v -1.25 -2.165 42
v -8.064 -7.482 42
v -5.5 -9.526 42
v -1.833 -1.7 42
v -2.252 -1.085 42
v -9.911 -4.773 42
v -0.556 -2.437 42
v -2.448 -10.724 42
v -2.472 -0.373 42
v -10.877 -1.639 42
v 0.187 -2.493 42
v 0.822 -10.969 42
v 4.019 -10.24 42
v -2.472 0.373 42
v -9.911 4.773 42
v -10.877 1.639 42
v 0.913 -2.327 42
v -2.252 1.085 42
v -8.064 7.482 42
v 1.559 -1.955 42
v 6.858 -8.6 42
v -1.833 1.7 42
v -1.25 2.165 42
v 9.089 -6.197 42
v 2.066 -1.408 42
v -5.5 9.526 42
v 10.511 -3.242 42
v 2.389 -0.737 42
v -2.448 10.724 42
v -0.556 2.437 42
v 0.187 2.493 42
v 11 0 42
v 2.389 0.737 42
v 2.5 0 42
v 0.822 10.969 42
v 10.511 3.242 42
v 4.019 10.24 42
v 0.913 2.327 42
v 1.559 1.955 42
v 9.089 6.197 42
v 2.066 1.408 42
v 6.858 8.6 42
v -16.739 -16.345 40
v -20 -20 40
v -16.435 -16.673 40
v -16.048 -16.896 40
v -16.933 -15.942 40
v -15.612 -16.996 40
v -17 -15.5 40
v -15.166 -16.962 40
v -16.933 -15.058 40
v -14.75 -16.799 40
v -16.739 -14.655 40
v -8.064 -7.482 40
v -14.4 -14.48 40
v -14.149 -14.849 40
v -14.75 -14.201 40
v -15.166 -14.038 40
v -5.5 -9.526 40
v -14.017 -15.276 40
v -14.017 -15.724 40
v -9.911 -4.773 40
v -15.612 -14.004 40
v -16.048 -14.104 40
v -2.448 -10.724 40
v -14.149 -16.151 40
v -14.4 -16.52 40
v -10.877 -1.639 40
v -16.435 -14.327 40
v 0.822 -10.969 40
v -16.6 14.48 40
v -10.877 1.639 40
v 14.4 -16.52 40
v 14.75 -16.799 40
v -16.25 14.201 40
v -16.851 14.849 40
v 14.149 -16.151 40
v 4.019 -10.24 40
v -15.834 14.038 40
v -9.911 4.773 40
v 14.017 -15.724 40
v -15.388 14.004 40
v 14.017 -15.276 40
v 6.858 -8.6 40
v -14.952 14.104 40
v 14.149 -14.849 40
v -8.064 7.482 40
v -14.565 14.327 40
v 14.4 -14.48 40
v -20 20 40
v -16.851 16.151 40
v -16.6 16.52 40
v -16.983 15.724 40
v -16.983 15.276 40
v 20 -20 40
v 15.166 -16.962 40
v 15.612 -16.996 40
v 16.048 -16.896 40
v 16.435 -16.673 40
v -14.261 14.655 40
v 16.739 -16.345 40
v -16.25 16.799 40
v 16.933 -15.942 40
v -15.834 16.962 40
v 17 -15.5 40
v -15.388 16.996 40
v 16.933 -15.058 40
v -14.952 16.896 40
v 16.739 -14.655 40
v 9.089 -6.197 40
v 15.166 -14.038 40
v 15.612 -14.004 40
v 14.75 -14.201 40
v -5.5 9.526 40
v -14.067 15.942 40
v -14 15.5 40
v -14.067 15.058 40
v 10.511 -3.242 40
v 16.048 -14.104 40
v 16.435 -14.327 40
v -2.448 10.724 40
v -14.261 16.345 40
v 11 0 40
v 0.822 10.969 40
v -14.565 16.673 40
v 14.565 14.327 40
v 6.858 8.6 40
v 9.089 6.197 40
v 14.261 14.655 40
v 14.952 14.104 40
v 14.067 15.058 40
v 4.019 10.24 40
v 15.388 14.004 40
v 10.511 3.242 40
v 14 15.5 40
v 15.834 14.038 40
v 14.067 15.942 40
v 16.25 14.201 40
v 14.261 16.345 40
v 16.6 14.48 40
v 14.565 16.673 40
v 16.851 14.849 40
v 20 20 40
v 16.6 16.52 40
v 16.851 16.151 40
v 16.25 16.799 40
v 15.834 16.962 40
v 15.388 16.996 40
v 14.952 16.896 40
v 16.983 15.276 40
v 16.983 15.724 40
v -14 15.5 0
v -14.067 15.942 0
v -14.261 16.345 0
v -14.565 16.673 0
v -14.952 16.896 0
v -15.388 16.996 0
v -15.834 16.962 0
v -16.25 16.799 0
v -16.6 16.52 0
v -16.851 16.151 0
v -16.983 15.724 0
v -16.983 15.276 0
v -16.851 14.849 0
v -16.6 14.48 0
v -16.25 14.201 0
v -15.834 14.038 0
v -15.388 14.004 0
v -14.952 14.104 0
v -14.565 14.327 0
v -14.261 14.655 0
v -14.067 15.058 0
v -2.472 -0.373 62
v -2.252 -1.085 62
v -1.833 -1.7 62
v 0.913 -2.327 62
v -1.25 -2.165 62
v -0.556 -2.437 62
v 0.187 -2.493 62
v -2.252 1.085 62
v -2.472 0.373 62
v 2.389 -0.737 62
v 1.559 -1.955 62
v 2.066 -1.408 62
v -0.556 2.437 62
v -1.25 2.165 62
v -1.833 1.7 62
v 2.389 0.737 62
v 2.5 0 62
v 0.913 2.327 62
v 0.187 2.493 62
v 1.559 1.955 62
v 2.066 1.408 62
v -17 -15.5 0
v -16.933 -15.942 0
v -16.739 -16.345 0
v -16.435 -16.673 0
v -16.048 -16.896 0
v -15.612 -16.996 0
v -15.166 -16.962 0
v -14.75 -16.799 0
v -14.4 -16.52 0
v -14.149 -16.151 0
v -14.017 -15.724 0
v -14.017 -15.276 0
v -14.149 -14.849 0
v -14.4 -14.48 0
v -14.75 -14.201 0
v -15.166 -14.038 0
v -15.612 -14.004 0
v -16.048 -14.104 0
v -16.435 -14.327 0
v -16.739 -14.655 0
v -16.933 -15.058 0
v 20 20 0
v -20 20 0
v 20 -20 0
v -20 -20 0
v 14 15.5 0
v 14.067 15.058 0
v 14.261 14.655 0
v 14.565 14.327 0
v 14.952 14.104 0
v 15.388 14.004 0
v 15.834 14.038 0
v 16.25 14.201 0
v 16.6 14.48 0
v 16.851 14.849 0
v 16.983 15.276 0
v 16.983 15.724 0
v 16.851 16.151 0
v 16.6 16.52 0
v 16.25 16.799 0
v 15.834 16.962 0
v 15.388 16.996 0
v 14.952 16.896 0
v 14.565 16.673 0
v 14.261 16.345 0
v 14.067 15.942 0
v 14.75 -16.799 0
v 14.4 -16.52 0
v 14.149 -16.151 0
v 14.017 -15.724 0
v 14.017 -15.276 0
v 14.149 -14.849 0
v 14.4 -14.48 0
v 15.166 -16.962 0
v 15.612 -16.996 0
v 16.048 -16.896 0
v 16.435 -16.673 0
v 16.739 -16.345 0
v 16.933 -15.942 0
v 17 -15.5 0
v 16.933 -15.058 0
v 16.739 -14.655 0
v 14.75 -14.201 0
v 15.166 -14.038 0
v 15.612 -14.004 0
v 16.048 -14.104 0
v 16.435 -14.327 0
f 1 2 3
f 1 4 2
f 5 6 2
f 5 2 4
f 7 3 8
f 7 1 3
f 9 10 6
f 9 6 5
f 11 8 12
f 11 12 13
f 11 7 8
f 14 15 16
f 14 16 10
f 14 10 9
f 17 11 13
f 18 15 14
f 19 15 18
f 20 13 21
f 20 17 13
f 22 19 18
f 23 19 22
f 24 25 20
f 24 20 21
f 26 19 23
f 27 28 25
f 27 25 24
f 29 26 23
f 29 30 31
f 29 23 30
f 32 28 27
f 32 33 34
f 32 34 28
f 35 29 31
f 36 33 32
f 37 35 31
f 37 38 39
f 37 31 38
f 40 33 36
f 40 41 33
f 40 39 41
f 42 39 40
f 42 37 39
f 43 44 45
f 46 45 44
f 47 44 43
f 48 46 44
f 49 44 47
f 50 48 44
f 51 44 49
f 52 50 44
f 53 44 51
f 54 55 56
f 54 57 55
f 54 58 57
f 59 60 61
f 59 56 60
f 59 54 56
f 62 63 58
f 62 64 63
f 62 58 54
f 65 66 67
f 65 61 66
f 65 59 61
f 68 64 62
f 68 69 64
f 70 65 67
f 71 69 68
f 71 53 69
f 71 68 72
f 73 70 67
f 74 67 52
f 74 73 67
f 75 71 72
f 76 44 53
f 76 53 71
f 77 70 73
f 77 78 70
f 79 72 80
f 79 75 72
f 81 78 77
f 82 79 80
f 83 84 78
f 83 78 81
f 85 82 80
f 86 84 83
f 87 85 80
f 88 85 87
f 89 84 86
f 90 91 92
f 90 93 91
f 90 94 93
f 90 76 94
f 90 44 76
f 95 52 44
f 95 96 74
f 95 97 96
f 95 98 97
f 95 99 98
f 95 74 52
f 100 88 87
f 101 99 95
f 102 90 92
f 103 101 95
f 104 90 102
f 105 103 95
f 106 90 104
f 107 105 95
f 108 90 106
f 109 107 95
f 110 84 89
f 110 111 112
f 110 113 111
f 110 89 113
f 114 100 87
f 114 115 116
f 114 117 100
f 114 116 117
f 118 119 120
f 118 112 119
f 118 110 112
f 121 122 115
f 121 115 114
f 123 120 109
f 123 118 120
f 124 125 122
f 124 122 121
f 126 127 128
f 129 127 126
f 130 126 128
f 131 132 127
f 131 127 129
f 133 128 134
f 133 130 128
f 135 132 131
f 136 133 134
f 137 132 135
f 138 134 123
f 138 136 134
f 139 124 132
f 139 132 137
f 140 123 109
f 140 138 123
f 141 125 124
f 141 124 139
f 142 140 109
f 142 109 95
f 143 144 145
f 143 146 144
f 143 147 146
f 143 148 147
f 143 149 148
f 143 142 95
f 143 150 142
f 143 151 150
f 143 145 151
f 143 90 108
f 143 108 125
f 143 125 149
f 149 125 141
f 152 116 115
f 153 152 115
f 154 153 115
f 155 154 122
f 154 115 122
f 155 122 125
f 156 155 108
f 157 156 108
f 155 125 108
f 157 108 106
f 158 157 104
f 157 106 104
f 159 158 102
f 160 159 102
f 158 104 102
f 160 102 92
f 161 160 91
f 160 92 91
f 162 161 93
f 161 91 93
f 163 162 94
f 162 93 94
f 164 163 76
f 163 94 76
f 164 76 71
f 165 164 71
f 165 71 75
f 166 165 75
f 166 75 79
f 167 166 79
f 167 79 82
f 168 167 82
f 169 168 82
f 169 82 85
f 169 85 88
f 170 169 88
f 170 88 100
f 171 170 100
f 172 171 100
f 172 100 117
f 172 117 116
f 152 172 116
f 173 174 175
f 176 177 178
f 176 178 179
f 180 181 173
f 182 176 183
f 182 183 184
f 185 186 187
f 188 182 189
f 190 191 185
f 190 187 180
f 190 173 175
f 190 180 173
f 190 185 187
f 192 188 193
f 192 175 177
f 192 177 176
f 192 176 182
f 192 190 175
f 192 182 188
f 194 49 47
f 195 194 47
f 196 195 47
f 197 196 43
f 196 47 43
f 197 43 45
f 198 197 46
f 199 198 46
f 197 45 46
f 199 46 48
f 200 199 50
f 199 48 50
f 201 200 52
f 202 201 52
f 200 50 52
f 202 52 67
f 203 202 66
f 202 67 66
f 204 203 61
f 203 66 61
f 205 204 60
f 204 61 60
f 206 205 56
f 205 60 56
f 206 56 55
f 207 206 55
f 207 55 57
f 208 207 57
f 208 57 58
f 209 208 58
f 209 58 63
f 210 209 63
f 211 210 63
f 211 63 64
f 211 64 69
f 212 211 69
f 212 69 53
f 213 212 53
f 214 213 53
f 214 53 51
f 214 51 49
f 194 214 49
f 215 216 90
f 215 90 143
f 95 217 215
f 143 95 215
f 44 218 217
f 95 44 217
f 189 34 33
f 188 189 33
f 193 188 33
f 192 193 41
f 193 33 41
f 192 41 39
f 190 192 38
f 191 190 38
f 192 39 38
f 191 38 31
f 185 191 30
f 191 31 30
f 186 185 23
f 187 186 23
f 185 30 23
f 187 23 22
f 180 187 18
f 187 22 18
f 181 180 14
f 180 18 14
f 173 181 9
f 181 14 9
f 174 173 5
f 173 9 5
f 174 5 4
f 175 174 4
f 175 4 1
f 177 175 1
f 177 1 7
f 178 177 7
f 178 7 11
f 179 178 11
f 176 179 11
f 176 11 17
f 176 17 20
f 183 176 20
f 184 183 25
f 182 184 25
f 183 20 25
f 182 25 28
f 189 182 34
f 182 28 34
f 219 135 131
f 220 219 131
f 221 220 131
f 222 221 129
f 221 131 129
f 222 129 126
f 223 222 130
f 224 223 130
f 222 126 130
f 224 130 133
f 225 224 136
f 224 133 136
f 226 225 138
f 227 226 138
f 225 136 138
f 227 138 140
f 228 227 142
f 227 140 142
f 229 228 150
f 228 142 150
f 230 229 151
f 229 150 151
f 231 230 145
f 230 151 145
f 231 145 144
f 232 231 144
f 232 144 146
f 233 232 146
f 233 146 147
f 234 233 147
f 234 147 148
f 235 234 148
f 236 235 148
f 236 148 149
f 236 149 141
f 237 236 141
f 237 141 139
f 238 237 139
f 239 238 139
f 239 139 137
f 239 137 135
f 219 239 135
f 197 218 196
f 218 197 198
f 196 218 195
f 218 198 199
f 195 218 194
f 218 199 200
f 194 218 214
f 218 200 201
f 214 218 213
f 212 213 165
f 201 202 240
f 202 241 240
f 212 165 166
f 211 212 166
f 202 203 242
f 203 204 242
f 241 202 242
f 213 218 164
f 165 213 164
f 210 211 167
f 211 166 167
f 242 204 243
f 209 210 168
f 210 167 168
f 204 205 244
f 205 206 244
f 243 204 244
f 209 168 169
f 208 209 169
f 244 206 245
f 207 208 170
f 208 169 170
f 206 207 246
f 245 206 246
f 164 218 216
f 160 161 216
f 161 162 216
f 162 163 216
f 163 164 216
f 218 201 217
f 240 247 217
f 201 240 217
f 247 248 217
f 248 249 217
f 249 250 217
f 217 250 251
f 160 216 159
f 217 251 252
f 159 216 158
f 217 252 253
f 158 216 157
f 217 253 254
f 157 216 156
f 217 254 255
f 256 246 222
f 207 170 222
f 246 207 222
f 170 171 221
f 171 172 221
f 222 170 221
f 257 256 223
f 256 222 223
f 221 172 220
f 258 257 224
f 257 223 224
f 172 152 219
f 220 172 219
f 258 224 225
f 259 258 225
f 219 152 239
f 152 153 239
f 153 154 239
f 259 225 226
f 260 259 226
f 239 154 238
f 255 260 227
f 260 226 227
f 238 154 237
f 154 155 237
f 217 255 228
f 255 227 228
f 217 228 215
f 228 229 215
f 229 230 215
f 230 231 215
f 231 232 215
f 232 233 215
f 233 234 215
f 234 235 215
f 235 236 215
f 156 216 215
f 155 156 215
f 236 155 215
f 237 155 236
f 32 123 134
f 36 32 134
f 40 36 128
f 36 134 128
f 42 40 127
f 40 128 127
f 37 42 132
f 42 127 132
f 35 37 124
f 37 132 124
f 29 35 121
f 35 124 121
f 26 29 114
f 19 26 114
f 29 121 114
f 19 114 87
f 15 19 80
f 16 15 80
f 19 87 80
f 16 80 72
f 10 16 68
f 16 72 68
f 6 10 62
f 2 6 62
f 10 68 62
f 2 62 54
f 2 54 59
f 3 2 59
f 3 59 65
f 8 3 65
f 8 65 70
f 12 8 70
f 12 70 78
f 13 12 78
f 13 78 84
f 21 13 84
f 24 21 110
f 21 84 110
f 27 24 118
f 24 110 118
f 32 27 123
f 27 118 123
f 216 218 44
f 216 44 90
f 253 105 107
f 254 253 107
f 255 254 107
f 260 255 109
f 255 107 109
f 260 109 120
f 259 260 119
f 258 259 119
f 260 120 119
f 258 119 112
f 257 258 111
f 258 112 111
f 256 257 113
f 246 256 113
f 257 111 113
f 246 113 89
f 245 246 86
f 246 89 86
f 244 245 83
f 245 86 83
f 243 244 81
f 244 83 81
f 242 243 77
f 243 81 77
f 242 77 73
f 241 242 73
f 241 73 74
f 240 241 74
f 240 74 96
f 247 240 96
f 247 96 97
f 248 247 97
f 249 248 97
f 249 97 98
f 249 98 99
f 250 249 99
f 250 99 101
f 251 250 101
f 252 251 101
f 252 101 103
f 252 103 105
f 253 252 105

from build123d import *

# Parameters (mm, degrees)
SKETCH1_W           = 40
SKETCH1_H           = 40
BOSS_EXTRUDE1_DEPTH = 40
SKETCH2_R           = 11
BOSS_EXTRUDE2_DEPTH = 2
SKETCH3_R           = 2.5
BOSS_EXTRUDE3_DEPTH = 20
SKETCH4_R           = 1.5
CUT_EXTRUDE1_DEPTH  = 49.989794856
SKETCH4_3_R         = 1.5
CUT_EXTRUDE2_DEPTH  = 49.989794856


with BuildPart() as part:
    # Sketch1 → Boss-Extrude1 (new body)
    with BuildSketch(Plane.XY):
        Rectangle(SKETCH1_W, SKETCH1_H)
    extrude(amount=BOSS_EXTRUDE1_DEPTH)

    # Sketch2 → Boss-Extrude2 (add)
    with BuildSketch(Plane.XY.offset(40)):
        Circle(SKETCH2_R)
    extrude(amount=BOSS_EXTRUDE2_DEPTH)

    # Sketch3 → Boss-Extrude3 (add)
    with BuildSketch(Plane.XY.offset(42)):
        Circle(SKETCH3_R)
    extrude(amount=BOSS_EXTRUDE3_DEPTH)

    # Sketch4 → Cut-Extrude1 (cut, through all)
    with BuildSketch(Plane.XY.offset(40)):
        with Locations((-15.5, 15.5)):
            Circle(SKETCH4_R)
        with Locations((-15.5, -15.5)):
            Circle(SKETCH4_R)
        with Locations((15.5, 15.5)):
            Circle(SKETCH4_R)
    extrude(amount=-CUT_EXTRUDE1_DEPTH, mode=Mode.SUBTRACT)

    # Sketch4<3> → Cut-Extrude2 (cut, through all)
    with BuildSketch(Plane.XY.offset(40)):
        with Locations((-15.5, 15.5)):
            Circle(SKETCH4_3_R)
        with Locations((-15.5, -15.5)):
            Circle(SKETCH4_3_R)
        with Locations((15.5, -15.5)):
            Circle(SKETCH4_3_R)
        with Locations((15.5, 15.5)):
            Circle(SKETCH4_3_R)
    extrude(amount=-CUT_EXTRUDE2_DEPTH, mode=Mode.SUBTRACT)


solid = part.part
